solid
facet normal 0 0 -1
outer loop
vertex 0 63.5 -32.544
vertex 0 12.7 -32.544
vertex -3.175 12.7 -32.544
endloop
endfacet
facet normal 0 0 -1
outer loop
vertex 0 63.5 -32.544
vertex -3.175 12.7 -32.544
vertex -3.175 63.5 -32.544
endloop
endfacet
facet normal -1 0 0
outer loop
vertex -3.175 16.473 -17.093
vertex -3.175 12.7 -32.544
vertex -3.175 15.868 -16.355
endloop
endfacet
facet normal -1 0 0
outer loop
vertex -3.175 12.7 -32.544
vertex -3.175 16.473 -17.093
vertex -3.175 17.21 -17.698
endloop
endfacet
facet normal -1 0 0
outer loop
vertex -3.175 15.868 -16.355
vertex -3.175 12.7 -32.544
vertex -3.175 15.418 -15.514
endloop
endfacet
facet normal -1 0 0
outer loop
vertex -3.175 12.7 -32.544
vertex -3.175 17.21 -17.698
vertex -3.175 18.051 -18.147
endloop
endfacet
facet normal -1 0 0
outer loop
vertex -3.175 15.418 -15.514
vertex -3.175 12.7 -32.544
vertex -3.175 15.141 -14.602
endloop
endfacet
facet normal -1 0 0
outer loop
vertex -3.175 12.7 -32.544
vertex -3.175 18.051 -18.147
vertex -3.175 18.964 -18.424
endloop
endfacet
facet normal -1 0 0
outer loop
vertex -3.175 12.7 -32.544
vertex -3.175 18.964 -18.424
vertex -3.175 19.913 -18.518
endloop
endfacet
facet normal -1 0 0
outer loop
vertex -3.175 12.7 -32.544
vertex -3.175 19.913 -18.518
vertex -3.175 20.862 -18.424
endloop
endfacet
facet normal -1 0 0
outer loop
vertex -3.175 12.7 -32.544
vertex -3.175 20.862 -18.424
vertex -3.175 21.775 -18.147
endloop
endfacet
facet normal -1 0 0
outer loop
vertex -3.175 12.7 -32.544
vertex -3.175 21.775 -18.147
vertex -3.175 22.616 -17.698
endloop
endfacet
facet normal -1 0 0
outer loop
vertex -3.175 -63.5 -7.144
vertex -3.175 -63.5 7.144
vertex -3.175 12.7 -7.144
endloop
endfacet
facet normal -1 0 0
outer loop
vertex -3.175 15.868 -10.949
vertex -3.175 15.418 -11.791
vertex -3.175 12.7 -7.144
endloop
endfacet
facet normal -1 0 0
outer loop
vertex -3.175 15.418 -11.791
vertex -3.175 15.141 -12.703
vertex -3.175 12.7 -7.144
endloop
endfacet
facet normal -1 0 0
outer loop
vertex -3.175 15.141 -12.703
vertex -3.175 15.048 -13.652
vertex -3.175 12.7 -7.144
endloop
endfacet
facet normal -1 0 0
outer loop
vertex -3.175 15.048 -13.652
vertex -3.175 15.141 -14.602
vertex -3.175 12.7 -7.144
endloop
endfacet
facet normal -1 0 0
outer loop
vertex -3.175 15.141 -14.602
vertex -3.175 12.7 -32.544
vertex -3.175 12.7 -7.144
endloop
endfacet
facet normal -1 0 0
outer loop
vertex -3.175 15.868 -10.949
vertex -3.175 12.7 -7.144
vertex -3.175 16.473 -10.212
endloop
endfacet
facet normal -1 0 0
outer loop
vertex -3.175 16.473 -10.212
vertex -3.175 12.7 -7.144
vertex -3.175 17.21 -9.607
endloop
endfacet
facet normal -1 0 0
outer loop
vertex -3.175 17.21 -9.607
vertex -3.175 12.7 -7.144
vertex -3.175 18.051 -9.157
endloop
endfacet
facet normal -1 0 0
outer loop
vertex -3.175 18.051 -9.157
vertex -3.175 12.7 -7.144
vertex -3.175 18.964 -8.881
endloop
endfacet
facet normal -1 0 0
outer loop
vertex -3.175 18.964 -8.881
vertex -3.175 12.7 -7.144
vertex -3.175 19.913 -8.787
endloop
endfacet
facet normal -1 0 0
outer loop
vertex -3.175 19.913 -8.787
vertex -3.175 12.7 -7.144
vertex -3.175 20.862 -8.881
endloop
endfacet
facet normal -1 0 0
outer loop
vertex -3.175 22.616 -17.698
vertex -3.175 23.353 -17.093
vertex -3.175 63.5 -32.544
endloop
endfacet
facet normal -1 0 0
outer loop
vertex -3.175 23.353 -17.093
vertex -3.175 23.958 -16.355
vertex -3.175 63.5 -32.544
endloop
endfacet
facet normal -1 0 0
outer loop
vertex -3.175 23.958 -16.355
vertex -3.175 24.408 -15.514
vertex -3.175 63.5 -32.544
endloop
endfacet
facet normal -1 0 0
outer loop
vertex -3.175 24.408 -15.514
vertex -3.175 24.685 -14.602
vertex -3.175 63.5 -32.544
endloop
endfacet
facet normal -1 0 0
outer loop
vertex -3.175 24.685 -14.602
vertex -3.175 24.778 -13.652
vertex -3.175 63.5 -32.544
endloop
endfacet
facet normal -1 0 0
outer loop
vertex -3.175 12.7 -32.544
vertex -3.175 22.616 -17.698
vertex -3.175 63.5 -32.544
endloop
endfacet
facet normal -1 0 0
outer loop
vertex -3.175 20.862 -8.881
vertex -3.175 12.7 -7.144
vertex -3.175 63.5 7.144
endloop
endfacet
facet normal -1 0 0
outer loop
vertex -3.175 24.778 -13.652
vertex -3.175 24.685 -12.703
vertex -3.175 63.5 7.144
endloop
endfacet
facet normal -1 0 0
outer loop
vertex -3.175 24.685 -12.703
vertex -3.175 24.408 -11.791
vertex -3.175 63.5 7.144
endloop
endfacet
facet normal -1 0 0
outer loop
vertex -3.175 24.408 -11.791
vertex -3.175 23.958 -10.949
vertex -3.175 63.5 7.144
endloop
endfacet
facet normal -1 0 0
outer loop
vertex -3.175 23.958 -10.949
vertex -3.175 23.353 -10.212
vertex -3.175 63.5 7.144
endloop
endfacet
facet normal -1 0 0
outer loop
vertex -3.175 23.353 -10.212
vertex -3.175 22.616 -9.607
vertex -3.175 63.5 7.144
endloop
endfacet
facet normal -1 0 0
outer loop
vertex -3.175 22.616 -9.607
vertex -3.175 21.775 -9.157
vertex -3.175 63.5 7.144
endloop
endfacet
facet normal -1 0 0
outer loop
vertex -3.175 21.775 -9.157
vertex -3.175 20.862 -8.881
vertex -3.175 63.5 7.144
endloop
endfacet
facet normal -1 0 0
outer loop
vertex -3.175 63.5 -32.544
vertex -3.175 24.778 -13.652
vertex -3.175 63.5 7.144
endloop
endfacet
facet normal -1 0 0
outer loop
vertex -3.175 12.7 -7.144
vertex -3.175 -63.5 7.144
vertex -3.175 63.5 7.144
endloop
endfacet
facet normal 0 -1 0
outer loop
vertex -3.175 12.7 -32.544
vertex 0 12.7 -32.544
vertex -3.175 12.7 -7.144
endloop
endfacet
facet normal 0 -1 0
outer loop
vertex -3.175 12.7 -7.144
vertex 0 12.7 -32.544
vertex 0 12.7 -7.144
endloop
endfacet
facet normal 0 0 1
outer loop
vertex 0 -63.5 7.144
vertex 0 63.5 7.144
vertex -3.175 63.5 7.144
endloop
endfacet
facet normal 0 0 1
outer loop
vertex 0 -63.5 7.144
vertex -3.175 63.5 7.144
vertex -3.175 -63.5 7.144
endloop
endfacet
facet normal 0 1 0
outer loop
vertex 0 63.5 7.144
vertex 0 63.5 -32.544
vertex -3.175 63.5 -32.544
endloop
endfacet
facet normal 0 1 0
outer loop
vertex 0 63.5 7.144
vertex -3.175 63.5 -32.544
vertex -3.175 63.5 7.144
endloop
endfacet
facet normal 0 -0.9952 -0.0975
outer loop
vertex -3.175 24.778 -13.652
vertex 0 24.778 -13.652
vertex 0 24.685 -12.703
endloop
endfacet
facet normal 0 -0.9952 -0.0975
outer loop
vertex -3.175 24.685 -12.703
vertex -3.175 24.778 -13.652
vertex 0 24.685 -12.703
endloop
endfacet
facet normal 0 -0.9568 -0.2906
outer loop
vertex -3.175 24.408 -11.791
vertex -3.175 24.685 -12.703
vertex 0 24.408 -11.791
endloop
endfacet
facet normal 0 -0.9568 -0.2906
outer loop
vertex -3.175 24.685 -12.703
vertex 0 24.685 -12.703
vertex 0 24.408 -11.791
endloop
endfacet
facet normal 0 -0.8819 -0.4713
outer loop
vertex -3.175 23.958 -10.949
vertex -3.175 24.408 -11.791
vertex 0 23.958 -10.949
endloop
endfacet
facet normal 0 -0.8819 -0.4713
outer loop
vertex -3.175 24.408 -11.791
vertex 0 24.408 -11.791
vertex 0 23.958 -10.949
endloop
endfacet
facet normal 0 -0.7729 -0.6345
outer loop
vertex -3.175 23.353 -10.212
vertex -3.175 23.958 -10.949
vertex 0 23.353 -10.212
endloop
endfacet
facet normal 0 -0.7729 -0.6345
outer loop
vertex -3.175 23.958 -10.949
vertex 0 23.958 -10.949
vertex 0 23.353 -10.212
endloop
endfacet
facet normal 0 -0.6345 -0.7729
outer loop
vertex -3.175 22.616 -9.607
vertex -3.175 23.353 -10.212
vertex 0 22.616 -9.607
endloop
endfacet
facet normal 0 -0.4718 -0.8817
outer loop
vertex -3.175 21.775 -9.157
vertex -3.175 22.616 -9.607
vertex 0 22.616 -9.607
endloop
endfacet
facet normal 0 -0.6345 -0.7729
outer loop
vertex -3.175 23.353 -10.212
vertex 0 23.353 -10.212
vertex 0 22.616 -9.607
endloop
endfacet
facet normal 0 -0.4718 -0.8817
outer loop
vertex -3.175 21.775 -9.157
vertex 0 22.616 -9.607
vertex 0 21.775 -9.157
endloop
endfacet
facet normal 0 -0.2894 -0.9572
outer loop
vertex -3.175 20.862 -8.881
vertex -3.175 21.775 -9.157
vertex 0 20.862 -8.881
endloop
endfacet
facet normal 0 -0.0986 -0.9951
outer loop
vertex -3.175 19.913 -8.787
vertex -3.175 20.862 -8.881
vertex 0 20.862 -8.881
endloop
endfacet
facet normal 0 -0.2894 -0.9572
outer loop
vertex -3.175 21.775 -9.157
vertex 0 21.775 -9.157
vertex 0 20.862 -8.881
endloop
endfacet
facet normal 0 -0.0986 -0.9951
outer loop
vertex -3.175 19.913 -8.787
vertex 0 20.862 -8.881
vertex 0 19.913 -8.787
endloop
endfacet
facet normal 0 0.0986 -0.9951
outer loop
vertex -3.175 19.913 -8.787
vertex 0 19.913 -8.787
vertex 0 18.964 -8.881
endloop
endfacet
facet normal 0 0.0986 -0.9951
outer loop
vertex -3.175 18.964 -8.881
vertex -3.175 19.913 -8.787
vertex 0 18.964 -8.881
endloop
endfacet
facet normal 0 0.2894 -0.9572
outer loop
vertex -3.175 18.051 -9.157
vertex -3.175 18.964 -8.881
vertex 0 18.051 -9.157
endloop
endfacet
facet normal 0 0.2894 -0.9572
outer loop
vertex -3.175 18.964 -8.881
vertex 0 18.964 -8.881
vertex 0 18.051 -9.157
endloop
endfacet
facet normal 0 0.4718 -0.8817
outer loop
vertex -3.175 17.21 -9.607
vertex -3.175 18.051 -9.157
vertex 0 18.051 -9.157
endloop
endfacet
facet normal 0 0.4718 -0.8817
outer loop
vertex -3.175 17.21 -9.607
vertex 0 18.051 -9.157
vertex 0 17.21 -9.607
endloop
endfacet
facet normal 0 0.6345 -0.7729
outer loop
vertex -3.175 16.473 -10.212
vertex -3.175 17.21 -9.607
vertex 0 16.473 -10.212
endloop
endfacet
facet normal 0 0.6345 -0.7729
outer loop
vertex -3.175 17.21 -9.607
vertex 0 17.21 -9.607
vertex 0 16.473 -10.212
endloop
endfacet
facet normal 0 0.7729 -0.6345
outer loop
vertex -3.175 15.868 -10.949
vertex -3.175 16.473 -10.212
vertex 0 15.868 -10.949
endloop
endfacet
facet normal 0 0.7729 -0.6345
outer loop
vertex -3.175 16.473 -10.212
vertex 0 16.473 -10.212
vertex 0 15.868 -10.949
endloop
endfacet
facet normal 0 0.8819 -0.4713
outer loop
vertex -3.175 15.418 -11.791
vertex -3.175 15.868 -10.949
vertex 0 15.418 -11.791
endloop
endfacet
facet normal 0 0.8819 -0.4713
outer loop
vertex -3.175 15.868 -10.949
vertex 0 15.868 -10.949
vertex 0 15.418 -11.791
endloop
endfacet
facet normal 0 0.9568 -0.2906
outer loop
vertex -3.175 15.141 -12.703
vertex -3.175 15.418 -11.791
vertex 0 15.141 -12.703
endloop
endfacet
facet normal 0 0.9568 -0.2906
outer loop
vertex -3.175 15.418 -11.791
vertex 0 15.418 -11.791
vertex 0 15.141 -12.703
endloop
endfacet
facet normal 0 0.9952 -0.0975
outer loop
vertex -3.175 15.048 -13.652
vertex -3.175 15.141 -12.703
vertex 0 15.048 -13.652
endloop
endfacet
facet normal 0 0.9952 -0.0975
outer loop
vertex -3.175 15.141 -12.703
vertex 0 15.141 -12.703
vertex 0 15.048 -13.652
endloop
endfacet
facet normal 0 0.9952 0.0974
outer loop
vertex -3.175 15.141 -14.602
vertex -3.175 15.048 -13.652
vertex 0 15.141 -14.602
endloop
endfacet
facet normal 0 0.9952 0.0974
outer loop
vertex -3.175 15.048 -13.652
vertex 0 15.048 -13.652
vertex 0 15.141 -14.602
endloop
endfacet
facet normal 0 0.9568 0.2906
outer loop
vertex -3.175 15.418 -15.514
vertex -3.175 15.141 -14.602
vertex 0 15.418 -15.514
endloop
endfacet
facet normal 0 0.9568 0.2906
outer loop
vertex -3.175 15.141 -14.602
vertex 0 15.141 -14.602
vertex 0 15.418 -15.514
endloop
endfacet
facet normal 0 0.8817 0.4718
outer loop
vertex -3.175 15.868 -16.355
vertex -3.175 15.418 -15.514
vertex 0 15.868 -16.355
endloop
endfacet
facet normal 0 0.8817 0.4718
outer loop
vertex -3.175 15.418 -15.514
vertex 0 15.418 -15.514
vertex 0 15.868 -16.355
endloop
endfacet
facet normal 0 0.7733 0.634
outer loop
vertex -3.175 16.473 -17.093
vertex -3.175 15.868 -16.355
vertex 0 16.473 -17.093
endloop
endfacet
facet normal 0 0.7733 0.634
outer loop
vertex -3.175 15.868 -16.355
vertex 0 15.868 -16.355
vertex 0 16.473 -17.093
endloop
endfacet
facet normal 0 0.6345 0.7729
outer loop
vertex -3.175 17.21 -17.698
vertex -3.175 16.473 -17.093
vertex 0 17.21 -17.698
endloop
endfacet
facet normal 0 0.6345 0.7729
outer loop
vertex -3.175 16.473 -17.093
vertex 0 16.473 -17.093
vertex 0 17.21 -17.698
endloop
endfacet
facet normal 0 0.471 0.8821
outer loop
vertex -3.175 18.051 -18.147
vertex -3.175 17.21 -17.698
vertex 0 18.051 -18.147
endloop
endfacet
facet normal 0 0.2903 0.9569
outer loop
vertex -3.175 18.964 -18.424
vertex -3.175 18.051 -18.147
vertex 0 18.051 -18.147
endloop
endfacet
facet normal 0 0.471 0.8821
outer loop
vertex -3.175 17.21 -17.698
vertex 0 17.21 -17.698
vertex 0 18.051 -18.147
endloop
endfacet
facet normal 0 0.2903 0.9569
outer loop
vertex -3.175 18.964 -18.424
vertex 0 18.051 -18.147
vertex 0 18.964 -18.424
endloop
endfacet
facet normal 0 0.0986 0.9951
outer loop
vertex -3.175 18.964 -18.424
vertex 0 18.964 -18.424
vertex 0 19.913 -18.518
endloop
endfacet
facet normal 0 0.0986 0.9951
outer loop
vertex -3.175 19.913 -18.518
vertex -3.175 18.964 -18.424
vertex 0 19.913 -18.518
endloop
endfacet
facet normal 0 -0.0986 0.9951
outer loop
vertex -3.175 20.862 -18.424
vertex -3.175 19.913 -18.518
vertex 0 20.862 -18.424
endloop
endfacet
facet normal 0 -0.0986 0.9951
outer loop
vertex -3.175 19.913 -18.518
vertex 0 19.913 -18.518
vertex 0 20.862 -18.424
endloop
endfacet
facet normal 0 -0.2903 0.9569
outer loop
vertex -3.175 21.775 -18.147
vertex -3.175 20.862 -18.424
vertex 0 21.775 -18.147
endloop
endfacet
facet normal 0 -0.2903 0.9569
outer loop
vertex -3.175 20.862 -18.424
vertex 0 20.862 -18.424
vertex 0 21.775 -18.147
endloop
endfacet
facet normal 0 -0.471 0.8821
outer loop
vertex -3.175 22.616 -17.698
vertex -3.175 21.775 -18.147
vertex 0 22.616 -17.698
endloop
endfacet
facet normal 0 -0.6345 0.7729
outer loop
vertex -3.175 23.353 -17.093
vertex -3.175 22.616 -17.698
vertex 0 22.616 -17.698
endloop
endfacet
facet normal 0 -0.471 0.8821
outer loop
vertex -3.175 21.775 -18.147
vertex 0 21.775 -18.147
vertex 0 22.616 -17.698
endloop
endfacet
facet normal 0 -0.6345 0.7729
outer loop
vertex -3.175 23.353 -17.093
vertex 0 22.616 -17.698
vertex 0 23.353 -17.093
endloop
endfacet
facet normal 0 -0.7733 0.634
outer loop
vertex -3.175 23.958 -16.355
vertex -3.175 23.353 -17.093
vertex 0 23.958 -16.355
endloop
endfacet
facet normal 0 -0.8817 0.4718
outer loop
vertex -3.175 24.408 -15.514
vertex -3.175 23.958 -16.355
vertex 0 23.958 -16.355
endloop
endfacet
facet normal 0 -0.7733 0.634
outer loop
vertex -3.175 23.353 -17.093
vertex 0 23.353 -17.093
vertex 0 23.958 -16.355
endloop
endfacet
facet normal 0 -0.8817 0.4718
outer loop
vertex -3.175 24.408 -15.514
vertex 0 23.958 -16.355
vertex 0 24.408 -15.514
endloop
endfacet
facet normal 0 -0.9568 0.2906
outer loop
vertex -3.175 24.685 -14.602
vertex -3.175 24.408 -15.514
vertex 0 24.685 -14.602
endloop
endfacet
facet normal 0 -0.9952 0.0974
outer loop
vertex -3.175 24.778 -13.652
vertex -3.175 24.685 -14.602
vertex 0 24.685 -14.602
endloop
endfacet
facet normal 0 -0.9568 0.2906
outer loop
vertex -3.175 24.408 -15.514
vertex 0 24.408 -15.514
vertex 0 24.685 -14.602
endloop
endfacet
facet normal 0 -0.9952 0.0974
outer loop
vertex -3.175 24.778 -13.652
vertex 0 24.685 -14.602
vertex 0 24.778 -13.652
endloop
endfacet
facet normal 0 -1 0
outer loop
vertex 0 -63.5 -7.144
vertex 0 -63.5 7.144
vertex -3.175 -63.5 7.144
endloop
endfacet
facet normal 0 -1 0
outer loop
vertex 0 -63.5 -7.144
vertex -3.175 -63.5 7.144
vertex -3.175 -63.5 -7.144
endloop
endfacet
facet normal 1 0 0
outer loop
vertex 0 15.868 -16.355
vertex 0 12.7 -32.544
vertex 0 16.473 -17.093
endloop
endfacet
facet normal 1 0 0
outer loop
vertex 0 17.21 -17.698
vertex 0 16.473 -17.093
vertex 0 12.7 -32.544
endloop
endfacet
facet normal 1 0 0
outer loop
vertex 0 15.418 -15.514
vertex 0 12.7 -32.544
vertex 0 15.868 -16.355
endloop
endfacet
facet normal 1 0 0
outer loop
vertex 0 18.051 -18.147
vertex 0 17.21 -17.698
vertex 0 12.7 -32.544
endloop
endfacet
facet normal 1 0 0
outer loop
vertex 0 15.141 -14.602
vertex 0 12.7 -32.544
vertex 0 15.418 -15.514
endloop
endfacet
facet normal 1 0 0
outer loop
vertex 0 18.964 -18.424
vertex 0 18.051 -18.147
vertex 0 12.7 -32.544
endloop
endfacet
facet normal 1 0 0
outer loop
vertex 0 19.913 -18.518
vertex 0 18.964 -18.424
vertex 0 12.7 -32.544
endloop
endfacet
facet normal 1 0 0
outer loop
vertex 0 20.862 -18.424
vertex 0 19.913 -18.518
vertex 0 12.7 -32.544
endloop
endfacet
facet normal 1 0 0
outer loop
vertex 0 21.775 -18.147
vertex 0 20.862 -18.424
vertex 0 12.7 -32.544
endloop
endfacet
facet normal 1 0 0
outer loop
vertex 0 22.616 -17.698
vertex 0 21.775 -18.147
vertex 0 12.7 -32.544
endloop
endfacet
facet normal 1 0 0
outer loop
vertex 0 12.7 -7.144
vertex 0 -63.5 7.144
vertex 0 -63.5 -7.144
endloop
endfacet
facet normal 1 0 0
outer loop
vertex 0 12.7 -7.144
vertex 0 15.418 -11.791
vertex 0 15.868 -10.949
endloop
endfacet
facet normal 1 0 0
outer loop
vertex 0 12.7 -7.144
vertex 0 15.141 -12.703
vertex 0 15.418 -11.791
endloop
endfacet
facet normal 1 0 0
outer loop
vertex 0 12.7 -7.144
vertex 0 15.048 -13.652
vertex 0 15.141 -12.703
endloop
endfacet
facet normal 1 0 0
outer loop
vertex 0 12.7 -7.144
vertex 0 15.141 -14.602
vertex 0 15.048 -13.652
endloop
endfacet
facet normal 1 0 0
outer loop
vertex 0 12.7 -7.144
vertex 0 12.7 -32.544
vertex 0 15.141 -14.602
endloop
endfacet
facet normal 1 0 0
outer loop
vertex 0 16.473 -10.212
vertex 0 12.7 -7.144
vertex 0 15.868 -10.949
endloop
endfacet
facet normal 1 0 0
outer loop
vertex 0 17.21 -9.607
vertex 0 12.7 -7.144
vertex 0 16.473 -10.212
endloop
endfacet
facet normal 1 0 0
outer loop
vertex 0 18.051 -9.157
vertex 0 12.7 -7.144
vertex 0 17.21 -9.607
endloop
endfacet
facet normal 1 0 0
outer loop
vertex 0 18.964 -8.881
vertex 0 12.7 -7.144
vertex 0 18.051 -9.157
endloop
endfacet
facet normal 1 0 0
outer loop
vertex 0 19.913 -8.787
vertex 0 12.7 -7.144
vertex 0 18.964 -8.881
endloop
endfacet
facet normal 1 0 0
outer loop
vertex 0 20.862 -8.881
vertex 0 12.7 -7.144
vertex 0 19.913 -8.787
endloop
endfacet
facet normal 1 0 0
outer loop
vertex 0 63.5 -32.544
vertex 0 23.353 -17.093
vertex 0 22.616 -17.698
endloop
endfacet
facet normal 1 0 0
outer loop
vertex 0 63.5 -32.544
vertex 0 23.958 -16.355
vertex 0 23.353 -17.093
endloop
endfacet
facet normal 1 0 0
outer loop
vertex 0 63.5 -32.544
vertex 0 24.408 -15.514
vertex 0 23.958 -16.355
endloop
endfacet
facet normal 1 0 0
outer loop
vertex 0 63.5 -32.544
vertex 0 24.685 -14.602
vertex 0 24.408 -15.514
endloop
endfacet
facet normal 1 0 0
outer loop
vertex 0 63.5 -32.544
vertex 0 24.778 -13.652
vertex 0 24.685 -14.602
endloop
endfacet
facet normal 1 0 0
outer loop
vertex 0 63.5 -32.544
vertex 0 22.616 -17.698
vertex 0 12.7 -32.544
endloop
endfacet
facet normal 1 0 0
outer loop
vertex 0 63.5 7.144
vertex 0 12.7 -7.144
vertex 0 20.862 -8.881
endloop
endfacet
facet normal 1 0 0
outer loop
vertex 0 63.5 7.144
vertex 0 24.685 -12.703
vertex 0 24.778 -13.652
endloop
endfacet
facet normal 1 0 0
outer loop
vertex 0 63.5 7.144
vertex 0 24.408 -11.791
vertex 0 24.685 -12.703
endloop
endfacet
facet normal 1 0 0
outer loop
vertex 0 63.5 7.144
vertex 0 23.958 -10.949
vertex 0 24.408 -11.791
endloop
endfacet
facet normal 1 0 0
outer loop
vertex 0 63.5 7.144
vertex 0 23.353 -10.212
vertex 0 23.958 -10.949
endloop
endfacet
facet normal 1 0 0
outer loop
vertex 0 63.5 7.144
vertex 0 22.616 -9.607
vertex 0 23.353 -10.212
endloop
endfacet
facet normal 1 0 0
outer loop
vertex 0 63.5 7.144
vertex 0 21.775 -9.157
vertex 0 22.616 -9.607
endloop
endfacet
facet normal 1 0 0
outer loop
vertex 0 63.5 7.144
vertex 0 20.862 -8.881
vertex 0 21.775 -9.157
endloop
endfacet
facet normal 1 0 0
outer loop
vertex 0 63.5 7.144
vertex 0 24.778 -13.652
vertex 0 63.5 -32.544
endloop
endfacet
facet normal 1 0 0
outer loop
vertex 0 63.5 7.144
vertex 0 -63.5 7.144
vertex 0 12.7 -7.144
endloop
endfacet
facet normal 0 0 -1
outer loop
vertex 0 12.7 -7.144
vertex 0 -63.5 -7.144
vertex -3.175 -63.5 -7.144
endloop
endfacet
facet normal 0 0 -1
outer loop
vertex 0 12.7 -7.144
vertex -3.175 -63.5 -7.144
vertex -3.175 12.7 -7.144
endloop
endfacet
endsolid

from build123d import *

# Parameters (mm, degrees)
F1_W     = 50.8
F1_H     = 25.4
F1_R     = 4.8652202412
F2_DEPTH = 3.175


# Not quite as in the source:
# - a variable given as a bare number and used for a length is read in inches; the dataset says mm whatever the document's units were


with BuildPart() as f2:
    # F1 (on Right) → F2 (new body)
    with BuildSketch(Plane.YZ):
        Polygon((63.5, 7.14375), (-63.5, 7.14375), (-63.5, -7.14375), (12.7, -7.14375), (63.5, -7.14375), align=None)
        with Locations((38.1, -19.84375)):
            Rectangle(F1_W, F1_H)
        with Locations((19.9129190296, -13.6523451656)):
            Circle(F1_R, mode=Mode.SUBTRACT)
    extrude(amount=-F2_DEPTH)


solid = f2.part
